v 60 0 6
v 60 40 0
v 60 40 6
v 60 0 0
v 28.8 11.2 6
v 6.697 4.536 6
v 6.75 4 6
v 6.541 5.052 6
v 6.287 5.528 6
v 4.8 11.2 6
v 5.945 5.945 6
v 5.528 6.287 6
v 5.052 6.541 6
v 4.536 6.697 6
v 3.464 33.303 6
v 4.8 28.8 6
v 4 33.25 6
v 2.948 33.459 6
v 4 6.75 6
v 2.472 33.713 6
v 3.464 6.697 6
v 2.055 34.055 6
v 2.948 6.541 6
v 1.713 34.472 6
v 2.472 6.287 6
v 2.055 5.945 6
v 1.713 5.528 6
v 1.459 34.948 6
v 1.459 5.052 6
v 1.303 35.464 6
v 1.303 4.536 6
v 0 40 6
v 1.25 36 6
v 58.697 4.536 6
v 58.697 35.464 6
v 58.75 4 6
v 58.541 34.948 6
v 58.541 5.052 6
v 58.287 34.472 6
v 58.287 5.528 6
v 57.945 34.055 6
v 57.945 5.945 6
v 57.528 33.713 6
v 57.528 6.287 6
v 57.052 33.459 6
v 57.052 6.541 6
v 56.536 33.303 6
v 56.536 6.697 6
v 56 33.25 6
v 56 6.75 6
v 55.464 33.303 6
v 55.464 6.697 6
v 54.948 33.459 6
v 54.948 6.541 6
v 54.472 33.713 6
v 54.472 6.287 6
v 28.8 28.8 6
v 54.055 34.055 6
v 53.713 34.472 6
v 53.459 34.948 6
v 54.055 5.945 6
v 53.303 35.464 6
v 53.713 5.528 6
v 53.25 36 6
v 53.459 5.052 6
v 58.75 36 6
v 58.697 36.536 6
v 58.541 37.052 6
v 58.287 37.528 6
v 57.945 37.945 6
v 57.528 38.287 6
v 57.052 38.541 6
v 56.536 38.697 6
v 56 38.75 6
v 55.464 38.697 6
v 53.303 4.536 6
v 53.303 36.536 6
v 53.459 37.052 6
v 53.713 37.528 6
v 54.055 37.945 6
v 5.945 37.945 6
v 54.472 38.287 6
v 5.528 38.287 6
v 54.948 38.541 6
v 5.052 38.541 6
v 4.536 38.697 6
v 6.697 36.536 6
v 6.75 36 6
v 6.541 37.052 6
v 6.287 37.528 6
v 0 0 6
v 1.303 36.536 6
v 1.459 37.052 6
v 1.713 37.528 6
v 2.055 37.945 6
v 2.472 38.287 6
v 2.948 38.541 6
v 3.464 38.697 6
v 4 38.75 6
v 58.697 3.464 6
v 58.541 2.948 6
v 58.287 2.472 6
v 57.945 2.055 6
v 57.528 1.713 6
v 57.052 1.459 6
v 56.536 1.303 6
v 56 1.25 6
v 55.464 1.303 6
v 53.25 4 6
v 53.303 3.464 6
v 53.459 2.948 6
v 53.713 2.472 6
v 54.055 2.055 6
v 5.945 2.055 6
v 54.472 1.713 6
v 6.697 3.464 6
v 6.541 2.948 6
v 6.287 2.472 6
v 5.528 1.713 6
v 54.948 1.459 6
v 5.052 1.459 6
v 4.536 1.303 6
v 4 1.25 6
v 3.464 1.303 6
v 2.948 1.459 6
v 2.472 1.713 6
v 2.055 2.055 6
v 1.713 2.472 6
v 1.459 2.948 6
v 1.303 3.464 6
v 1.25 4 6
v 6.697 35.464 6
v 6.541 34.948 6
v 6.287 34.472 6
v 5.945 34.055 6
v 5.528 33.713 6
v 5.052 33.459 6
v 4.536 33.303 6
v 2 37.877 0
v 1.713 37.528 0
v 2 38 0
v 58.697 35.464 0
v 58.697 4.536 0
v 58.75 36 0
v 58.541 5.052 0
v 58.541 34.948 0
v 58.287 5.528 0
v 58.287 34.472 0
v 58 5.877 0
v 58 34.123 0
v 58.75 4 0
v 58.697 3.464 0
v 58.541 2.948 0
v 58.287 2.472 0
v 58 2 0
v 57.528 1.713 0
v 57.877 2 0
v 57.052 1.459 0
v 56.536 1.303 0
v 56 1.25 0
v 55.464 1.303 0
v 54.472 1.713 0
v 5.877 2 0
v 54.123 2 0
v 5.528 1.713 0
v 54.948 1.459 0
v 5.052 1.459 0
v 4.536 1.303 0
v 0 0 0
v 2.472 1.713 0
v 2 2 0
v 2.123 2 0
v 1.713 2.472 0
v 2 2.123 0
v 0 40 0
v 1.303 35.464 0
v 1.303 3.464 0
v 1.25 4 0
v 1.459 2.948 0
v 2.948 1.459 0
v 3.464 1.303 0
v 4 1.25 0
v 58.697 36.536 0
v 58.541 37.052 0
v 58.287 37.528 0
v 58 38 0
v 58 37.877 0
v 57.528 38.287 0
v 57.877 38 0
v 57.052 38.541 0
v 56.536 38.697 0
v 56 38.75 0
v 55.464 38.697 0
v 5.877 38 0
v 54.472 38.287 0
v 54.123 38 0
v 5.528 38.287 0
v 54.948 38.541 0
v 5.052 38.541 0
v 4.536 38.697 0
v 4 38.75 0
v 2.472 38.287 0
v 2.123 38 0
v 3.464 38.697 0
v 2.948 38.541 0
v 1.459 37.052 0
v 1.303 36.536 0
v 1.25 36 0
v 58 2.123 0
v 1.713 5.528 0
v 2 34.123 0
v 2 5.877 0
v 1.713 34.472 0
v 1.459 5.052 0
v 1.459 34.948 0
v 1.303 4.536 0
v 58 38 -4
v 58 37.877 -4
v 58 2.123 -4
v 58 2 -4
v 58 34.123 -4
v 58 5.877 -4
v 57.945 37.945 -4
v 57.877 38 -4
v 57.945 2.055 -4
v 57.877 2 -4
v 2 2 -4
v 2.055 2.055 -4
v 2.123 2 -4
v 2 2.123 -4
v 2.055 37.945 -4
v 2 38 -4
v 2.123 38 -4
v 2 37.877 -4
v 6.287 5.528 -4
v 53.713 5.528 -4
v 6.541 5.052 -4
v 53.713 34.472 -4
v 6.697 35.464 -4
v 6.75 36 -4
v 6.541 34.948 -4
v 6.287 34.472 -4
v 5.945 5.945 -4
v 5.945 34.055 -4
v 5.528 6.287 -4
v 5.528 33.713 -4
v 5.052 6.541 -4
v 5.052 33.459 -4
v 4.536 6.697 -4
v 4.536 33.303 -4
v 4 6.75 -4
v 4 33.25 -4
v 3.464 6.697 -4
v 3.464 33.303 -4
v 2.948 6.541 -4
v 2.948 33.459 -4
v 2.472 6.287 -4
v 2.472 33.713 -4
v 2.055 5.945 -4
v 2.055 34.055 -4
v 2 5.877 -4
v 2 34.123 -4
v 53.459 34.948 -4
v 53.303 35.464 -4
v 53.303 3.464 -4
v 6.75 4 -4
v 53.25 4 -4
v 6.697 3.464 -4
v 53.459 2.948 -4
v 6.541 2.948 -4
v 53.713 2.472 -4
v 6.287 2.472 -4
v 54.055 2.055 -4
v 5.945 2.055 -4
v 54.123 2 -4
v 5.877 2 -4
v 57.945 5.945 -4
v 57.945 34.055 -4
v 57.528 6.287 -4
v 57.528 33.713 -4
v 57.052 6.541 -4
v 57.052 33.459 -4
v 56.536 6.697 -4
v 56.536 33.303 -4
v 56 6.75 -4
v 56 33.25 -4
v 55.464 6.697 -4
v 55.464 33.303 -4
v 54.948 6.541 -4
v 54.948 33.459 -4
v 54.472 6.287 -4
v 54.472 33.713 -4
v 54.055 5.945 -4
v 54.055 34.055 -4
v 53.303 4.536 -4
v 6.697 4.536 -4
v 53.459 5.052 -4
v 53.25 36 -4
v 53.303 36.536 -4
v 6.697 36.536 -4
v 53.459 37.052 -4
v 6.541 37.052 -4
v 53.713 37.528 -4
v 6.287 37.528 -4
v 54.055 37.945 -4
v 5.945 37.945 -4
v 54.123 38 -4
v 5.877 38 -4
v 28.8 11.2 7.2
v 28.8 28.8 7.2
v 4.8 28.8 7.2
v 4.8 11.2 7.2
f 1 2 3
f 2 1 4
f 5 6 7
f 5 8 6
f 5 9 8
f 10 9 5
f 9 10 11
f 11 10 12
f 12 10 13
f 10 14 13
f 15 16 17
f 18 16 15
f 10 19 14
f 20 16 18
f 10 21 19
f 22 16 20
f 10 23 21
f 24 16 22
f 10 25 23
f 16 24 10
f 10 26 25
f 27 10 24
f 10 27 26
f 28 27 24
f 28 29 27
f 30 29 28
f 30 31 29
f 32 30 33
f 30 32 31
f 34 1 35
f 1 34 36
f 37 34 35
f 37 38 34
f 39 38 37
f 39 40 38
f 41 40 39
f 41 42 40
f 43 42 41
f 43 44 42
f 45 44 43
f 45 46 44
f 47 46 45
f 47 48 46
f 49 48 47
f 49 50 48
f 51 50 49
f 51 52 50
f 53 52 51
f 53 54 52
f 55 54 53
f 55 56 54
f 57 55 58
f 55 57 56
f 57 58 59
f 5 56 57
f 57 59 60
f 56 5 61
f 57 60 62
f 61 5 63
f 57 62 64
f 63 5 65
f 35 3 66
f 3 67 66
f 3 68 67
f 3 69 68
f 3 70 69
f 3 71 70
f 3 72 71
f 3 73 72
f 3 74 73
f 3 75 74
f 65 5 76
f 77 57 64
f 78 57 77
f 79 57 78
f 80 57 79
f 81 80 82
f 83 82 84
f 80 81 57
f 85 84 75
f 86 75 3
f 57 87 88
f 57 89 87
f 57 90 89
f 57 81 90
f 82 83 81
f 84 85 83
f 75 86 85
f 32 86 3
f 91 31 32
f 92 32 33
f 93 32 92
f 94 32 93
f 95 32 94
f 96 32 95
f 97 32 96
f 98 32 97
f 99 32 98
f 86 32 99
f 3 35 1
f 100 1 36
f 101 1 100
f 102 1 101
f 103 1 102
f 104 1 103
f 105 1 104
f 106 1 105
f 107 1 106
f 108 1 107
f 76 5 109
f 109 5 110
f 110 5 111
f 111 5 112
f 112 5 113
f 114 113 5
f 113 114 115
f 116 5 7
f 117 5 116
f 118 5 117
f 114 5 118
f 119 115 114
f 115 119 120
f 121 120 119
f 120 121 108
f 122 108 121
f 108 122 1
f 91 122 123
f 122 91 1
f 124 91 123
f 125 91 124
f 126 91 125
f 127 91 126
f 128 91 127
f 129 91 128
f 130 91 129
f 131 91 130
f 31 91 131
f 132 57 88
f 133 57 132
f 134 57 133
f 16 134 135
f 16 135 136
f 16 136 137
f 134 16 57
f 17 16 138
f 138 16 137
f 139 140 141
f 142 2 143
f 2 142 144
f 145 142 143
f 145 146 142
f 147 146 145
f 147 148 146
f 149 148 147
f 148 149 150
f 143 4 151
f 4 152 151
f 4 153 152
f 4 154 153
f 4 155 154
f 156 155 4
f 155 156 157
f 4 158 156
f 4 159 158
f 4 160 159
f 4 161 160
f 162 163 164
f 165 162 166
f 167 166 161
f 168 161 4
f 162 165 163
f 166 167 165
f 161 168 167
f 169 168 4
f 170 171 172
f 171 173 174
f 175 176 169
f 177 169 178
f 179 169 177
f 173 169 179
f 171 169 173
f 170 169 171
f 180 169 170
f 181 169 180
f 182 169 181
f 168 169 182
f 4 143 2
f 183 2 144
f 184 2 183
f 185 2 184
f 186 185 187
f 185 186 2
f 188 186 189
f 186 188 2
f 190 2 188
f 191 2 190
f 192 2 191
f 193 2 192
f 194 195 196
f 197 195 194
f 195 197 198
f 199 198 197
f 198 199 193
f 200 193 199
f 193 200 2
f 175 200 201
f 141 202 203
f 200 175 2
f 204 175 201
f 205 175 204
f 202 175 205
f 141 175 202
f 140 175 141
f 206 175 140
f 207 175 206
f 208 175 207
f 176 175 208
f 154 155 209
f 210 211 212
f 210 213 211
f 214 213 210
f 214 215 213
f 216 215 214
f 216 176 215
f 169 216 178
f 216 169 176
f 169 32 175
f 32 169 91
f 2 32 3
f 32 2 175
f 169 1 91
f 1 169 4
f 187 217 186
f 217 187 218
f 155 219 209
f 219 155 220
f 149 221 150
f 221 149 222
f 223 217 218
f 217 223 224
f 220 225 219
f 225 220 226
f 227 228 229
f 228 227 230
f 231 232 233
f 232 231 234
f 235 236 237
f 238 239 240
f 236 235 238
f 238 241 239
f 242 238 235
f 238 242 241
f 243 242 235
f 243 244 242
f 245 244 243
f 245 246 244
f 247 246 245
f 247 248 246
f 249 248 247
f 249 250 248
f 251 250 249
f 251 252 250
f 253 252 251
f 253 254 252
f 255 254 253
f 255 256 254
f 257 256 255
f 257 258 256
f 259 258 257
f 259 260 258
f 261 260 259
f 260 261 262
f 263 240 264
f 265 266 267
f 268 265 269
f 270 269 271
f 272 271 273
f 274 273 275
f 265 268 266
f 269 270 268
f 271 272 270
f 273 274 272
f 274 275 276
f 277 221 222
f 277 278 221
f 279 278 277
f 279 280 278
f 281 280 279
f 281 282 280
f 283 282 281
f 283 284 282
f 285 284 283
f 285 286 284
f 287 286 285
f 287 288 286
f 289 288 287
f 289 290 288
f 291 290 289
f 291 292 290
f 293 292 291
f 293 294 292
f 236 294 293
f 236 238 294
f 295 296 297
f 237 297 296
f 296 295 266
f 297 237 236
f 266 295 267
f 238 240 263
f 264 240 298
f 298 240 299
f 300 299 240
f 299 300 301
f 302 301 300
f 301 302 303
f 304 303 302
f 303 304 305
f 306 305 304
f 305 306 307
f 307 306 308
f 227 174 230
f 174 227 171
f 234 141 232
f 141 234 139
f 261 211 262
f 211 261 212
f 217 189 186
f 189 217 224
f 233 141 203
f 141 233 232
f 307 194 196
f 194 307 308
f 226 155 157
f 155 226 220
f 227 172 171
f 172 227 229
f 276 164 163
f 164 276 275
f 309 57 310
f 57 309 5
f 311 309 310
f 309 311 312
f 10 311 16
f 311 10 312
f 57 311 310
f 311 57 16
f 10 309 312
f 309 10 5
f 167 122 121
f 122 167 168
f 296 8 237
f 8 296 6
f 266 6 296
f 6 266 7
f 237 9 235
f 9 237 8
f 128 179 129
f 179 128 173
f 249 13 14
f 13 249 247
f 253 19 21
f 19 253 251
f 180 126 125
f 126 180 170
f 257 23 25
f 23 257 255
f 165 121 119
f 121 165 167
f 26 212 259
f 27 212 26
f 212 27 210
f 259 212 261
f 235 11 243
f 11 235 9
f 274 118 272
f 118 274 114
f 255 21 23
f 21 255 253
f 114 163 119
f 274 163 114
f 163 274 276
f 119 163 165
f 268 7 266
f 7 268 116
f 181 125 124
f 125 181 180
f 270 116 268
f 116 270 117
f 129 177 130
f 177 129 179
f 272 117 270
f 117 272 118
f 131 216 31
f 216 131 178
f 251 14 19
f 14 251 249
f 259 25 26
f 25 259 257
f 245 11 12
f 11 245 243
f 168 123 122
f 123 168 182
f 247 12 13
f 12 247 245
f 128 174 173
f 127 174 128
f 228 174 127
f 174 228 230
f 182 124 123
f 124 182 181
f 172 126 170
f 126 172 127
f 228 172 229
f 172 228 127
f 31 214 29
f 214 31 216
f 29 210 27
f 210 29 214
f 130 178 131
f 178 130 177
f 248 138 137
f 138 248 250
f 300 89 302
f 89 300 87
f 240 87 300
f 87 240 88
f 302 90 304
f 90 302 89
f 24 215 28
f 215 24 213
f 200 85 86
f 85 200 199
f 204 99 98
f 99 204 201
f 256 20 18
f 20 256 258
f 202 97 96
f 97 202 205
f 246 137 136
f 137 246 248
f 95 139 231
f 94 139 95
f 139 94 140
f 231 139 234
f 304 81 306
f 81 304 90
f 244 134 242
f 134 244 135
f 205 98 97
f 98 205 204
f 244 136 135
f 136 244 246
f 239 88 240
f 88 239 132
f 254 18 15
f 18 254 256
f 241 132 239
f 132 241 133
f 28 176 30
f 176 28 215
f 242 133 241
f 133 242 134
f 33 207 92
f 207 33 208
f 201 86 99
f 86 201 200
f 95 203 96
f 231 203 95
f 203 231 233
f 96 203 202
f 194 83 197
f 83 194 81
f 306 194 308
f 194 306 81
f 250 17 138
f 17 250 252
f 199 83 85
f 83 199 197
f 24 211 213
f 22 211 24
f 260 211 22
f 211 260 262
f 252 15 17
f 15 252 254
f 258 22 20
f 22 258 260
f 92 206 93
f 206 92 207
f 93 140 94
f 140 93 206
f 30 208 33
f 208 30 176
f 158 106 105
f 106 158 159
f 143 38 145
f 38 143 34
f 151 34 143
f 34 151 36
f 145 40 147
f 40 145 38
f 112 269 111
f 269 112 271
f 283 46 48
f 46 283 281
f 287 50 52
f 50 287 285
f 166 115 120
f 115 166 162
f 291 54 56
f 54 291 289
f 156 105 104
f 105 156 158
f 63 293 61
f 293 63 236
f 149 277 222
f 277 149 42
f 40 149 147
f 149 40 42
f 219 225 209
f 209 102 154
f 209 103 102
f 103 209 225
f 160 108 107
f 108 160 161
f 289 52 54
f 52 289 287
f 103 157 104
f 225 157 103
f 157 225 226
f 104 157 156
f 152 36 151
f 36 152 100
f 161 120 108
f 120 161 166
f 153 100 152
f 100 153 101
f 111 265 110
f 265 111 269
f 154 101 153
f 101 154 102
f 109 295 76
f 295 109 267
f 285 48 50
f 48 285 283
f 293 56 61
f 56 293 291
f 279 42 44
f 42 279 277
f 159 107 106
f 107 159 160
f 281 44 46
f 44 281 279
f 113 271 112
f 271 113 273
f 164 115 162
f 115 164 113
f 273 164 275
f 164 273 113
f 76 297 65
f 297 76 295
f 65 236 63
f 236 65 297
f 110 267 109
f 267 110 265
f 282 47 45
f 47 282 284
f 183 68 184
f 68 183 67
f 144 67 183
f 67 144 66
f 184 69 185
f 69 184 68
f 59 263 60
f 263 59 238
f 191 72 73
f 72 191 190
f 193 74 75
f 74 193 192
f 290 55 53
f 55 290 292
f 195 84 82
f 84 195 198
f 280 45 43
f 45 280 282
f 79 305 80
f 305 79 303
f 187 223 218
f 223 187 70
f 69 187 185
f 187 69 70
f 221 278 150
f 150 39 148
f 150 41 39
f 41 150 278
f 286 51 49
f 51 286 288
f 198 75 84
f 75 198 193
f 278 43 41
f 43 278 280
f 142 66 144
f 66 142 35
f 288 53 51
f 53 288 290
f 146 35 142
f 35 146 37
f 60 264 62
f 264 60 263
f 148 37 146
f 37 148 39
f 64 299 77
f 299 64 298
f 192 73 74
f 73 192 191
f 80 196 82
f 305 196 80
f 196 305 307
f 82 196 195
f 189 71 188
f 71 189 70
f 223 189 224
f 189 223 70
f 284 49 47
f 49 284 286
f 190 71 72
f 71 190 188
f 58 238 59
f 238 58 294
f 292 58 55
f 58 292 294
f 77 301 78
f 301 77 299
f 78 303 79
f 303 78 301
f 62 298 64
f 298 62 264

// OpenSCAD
$fn = 32;

// ----------------------------------------------------------------------
// Enclosure lid: 60 x 40 x 6 mm, 4 bolt holes
// ----------------------------------------------------------------------

// --- parameters (mm) ---
length = 60;              // lid length, X
width = 40;               // lid width, Y
plate_t = 6;              // lid plate thickness
bolt_d = 5.5;             // bolt clearance
boss_lip = 4;             // bolt hole inset from the corner
sink = 1;                 // overlap of the lip and ribs into the plate
lip_h = 5;                // lip height below the plate
lip_wall = 2;             // lip wall thickness
label_h = 1.2;            // raised marking pad

module plate() {
  cube([length, width, plate_t]);
  /* lip that drops into the housing opening, sunk into the plate */
  translate([lip_wall, lip_wall, -lip_h + sink]) cube([length - 2 * lip_wall, width - 2 * lip_wall, lip_h]);
  /* raised marking pad on top, sunk 1 mm into the plate */
  translate([length * 0.08, width * 0.28, plate_t - 1]) cube([length * 0.4, width * 0.44, label_h + 1]);
}

difference() {
  plate();
  /* bolt pattern matching the corner bosses */
  for (sx = [0, 1]) for (sy = [0, 1])
    translate([sx * (length - 2 * boss_lip) + boss_lip, sy * (width - 2 * boss_lip) + boss_lip, -lip_h - 1])
      cylinder(h = plate_t + lip_h + 2, d = bolt_d);
}
